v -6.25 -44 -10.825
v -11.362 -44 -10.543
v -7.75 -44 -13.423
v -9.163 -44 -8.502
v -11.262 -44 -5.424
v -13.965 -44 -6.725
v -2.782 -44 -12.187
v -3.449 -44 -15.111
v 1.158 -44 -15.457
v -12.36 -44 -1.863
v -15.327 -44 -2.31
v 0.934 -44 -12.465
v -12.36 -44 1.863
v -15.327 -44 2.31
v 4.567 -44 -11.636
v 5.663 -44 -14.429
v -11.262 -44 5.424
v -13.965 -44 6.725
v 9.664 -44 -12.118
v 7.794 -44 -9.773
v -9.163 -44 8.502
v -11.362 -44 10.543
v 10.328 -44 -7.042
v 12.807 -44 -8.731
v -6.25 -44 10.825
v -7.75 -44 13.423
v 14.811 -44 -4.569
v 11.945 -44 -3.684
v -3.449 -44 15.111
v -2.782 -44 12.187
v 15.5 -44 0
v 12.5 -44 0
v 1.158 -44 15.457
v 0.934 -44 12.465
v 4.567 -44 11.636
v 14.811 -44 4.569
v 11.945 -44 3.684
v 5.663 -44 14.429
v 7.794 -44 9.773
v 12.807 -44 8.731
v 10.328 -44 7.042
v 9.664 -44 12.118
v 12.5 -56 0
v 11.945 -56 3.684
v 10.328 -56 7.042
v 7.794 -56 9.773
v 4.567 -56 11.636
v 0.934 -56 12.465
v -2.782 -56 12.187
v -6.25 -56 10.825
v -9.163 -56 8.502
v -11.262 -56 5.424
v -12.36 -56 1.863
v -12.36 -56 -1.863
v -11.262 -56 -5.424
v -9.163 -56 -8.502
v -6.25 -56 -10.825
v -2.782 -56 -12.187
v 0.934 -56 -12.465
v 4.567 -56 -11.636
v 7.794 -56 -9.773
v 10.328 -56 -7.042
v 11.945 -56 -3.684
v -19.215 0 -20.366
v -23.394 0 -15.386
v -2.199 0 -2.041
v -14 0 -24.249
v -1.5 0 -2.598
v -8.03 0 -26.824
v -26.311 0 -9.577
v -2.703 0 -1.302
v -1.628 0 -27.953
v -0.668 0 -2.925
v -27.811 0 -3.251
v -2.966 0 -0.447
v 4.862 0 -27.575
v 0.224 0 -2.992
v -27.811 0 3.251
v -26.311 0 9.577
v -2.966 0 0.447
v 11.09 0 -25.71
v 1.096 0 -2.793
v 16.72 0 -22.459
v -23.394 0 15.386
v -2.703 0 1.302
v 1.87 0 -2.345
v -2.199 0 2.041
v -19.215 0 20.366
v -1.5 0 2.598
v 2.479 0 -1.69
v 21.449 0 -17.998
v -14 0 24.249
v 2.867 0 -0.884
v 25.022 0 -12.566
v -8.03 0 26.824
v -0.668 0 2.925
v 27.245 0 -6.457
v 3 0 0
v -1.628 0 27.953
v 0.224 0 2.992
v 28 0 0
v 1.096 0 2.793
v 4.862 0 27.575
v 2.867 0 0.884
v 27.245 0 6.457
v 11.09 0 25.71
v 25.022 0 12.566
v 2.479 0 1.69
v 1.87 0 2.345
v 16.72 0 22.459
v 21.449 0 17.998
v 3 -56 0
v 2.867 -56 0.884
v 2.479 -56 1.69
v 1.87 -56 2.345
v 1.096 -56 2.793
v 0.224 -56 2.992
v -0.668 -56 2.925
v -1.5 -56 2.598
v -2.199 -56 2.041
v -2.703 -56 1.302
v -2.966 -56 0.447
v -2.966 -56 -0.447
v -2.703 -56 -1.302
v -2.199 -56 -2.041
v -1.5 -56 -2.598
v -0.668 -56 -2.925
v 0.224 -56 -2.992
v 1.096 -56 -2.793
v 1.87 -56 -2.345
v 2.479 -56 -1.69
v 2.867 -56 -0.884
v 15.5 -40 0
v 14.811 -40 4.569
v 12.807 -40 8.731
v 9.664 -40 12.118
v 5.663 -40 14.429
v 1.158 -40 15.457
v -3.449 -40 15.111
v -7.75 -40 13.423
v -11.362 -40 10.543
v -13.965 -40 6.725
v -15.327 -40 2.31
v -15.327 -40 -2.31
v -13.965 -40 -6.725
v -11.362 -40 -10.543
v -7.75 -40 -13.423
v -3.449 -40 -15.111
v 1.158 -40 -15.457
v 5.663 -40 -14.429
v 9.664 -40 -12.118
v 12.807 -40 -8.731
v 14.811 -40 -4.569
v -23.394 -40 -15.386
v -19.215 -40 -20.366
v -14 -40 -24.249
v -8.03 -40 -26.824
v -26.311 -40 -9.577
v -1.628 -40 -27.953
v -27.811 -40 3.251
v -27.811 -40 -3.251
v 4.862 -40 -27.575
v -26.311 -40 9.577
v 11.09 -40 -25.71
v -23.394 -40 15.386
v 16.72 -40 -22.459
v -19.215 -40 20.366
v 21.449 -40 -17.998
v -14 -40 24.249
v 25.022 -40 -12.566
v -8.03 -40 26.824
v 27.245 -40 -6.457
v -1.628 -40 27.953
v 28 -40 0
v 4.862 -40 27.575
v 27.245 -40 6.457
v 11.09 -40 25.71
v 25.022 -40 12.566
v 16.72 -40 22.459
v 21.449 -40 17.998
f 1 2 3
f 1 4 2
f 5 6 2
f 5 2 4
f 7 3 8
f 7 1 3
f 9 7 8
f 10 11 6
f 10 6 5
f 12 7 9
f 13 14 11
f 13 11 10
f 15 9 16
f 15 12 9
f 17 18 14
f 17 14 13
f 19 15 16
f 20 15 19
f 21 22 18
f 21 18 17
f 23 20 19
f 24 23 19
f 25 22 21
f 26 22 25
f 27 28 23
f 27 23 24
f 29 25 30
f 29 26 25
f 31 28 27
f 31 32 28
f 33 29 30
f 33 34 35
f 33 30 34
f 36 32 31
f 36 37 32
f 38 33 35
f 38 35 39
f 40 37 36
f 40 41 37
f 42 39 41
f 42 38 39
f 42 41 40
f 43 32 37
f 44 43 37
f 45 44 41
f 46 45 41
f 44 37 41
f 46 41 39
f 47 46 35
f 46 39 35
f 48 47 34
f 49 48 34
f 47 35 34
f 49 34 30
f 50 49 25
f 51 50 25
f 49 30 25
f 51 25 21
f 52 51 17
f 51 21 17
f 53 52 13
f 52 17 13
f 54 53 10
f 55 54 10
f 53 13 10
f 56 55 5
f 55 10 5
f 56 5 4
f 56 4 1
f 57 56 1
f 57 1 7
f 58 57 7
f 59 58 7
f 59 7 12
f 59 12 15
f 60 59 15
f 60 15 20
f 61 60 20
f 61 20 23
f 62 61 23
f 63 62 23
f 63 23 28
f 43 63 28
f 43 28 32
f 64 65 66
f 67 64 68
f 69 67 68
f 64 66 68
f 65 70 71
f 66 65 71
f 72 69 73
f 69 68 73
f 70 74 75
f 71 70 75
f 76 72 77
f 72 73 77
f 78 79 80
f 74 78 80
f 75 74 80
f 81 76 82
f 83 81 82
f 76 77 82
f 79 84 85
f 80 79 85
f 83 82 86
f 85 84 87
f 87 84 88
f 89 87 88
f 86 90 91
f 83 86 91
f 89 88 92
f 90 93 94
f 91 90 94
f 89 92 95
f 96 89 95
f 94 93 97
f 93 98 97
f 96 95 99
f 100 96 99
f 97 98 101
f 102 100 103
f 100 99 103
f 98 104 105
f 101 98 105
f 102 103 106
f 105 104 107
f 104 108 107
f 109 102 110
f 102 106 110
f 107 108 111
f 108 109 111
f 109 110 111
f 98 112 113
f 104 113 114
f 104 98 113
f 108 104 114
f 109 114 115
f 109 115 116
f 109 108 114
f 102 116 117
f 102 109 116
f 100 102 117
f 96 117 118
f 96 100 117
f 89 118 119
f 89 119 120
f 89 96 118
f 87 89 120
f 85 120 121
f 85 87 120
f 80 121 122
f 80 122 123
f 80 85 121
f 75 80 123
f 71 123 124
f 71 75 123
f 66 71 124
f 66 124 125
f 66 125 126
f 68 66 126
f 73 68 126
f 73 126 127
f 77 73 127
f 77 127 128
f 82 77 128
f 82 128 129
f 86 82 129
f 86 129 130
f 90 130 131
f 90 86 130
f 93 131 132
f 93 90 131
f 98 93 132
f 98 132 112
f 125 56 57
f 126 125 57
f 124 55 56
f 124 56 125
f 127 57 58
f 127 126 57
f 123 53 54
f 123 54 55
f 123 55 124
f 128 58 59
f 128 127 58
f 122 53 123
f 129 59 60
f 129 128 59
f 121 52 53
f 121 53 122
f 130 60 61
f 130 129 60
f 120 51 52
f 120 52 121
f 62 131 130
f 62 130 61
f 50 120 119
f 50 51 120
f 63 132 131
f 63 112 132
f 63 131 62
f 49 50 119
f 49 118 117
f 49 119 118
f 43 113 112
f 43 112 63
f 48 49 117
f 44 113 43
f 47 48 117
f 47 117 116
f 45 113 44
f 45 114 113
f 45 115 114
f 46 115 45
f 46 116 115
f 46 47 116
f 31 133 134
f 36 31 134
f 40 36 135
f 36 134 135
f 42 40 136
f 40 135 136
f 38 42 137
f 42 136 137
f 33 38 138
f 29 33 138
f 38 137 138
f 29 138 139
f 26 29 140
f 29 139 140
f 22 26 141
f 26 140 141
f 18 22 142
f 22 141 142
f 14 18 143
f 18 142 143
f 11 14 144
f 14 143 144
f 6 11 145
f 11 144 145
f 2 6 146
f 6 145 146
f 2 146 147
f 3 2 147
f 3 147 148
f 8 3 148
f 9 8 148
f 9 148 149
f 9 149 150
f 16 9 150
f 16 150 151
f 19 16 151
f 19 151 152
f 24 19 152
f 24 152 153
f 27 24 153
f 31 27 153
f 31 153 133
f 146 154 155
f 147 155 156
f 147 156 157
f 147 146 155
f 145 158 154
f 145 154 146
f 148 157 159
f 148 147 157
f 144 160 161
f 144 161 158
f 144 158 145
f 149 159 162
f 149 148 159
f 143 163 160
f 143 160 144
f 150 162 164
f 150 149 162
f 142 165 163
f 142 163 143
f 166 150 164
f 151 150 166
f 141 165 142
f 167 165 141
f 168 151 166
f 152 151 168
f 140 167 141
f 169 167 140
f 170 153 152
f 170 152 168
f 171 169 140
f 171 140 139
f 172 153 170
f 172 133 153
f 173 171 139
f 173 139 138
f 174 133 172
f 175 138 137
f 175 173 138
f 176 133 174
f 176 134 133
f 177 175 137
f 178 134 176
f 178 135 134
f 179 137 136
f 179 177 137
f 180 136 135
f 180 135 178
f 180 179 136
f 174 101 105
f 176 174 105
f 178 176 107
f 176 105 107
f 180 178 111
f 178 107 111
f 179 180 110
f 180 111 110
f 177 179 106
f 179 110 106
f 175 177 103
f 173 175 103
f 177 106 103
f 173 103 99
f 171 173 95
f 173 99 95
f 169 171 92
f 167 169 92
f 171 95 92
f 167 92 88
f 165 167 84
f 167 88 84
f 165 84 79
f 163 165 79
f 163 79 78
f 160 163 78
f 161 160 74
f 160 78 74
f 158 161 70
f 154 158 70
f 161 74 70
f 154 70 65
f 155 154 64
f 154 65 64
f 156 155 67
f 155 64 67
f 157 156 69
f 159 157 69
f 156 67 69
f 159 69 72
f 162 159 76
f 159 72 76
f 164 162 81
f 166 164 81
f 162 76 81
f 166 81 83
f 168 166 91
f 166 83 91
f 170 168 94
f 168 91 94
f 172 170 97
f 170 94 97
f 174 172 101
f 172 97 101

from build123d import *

# Parameters (mm, degrees)
F0_R     = 12.5
F0_R_2   = 3
F1_DEPTH = 56
F0_R_3   = 15.5
F2_DEPTH = 44
F0_R_4   = 28
F3_DEPTH = 40


with BuildPart() as f1:
    # F0 (on Front) → F1 (new body)
    with BuildSketch(Plane.XZ):
        Circle(F0_R)
        Circle(F0_R_2, mode=Mode.SUBTRACT)
    extrude(amount=F1_DEPTH)

    # F0 (on Front) → F2 (join)
    with BuildSketch(Plane.XZ):
        Circle(F0_R_3)
        Circle(F0_R, mode=Mode.SUBTRACT)
    extrude(amount=F2_DEPTH)

    # F0 (on Front) → F3 (join)
    with BuildSketch(Plane.XZ):
        Circle(F0_R_4)
        Circle(F0_R_3, mode=Mode.SUBTRACT)
    extrude(amount=F3_DEPTH)


solid = f1.part
